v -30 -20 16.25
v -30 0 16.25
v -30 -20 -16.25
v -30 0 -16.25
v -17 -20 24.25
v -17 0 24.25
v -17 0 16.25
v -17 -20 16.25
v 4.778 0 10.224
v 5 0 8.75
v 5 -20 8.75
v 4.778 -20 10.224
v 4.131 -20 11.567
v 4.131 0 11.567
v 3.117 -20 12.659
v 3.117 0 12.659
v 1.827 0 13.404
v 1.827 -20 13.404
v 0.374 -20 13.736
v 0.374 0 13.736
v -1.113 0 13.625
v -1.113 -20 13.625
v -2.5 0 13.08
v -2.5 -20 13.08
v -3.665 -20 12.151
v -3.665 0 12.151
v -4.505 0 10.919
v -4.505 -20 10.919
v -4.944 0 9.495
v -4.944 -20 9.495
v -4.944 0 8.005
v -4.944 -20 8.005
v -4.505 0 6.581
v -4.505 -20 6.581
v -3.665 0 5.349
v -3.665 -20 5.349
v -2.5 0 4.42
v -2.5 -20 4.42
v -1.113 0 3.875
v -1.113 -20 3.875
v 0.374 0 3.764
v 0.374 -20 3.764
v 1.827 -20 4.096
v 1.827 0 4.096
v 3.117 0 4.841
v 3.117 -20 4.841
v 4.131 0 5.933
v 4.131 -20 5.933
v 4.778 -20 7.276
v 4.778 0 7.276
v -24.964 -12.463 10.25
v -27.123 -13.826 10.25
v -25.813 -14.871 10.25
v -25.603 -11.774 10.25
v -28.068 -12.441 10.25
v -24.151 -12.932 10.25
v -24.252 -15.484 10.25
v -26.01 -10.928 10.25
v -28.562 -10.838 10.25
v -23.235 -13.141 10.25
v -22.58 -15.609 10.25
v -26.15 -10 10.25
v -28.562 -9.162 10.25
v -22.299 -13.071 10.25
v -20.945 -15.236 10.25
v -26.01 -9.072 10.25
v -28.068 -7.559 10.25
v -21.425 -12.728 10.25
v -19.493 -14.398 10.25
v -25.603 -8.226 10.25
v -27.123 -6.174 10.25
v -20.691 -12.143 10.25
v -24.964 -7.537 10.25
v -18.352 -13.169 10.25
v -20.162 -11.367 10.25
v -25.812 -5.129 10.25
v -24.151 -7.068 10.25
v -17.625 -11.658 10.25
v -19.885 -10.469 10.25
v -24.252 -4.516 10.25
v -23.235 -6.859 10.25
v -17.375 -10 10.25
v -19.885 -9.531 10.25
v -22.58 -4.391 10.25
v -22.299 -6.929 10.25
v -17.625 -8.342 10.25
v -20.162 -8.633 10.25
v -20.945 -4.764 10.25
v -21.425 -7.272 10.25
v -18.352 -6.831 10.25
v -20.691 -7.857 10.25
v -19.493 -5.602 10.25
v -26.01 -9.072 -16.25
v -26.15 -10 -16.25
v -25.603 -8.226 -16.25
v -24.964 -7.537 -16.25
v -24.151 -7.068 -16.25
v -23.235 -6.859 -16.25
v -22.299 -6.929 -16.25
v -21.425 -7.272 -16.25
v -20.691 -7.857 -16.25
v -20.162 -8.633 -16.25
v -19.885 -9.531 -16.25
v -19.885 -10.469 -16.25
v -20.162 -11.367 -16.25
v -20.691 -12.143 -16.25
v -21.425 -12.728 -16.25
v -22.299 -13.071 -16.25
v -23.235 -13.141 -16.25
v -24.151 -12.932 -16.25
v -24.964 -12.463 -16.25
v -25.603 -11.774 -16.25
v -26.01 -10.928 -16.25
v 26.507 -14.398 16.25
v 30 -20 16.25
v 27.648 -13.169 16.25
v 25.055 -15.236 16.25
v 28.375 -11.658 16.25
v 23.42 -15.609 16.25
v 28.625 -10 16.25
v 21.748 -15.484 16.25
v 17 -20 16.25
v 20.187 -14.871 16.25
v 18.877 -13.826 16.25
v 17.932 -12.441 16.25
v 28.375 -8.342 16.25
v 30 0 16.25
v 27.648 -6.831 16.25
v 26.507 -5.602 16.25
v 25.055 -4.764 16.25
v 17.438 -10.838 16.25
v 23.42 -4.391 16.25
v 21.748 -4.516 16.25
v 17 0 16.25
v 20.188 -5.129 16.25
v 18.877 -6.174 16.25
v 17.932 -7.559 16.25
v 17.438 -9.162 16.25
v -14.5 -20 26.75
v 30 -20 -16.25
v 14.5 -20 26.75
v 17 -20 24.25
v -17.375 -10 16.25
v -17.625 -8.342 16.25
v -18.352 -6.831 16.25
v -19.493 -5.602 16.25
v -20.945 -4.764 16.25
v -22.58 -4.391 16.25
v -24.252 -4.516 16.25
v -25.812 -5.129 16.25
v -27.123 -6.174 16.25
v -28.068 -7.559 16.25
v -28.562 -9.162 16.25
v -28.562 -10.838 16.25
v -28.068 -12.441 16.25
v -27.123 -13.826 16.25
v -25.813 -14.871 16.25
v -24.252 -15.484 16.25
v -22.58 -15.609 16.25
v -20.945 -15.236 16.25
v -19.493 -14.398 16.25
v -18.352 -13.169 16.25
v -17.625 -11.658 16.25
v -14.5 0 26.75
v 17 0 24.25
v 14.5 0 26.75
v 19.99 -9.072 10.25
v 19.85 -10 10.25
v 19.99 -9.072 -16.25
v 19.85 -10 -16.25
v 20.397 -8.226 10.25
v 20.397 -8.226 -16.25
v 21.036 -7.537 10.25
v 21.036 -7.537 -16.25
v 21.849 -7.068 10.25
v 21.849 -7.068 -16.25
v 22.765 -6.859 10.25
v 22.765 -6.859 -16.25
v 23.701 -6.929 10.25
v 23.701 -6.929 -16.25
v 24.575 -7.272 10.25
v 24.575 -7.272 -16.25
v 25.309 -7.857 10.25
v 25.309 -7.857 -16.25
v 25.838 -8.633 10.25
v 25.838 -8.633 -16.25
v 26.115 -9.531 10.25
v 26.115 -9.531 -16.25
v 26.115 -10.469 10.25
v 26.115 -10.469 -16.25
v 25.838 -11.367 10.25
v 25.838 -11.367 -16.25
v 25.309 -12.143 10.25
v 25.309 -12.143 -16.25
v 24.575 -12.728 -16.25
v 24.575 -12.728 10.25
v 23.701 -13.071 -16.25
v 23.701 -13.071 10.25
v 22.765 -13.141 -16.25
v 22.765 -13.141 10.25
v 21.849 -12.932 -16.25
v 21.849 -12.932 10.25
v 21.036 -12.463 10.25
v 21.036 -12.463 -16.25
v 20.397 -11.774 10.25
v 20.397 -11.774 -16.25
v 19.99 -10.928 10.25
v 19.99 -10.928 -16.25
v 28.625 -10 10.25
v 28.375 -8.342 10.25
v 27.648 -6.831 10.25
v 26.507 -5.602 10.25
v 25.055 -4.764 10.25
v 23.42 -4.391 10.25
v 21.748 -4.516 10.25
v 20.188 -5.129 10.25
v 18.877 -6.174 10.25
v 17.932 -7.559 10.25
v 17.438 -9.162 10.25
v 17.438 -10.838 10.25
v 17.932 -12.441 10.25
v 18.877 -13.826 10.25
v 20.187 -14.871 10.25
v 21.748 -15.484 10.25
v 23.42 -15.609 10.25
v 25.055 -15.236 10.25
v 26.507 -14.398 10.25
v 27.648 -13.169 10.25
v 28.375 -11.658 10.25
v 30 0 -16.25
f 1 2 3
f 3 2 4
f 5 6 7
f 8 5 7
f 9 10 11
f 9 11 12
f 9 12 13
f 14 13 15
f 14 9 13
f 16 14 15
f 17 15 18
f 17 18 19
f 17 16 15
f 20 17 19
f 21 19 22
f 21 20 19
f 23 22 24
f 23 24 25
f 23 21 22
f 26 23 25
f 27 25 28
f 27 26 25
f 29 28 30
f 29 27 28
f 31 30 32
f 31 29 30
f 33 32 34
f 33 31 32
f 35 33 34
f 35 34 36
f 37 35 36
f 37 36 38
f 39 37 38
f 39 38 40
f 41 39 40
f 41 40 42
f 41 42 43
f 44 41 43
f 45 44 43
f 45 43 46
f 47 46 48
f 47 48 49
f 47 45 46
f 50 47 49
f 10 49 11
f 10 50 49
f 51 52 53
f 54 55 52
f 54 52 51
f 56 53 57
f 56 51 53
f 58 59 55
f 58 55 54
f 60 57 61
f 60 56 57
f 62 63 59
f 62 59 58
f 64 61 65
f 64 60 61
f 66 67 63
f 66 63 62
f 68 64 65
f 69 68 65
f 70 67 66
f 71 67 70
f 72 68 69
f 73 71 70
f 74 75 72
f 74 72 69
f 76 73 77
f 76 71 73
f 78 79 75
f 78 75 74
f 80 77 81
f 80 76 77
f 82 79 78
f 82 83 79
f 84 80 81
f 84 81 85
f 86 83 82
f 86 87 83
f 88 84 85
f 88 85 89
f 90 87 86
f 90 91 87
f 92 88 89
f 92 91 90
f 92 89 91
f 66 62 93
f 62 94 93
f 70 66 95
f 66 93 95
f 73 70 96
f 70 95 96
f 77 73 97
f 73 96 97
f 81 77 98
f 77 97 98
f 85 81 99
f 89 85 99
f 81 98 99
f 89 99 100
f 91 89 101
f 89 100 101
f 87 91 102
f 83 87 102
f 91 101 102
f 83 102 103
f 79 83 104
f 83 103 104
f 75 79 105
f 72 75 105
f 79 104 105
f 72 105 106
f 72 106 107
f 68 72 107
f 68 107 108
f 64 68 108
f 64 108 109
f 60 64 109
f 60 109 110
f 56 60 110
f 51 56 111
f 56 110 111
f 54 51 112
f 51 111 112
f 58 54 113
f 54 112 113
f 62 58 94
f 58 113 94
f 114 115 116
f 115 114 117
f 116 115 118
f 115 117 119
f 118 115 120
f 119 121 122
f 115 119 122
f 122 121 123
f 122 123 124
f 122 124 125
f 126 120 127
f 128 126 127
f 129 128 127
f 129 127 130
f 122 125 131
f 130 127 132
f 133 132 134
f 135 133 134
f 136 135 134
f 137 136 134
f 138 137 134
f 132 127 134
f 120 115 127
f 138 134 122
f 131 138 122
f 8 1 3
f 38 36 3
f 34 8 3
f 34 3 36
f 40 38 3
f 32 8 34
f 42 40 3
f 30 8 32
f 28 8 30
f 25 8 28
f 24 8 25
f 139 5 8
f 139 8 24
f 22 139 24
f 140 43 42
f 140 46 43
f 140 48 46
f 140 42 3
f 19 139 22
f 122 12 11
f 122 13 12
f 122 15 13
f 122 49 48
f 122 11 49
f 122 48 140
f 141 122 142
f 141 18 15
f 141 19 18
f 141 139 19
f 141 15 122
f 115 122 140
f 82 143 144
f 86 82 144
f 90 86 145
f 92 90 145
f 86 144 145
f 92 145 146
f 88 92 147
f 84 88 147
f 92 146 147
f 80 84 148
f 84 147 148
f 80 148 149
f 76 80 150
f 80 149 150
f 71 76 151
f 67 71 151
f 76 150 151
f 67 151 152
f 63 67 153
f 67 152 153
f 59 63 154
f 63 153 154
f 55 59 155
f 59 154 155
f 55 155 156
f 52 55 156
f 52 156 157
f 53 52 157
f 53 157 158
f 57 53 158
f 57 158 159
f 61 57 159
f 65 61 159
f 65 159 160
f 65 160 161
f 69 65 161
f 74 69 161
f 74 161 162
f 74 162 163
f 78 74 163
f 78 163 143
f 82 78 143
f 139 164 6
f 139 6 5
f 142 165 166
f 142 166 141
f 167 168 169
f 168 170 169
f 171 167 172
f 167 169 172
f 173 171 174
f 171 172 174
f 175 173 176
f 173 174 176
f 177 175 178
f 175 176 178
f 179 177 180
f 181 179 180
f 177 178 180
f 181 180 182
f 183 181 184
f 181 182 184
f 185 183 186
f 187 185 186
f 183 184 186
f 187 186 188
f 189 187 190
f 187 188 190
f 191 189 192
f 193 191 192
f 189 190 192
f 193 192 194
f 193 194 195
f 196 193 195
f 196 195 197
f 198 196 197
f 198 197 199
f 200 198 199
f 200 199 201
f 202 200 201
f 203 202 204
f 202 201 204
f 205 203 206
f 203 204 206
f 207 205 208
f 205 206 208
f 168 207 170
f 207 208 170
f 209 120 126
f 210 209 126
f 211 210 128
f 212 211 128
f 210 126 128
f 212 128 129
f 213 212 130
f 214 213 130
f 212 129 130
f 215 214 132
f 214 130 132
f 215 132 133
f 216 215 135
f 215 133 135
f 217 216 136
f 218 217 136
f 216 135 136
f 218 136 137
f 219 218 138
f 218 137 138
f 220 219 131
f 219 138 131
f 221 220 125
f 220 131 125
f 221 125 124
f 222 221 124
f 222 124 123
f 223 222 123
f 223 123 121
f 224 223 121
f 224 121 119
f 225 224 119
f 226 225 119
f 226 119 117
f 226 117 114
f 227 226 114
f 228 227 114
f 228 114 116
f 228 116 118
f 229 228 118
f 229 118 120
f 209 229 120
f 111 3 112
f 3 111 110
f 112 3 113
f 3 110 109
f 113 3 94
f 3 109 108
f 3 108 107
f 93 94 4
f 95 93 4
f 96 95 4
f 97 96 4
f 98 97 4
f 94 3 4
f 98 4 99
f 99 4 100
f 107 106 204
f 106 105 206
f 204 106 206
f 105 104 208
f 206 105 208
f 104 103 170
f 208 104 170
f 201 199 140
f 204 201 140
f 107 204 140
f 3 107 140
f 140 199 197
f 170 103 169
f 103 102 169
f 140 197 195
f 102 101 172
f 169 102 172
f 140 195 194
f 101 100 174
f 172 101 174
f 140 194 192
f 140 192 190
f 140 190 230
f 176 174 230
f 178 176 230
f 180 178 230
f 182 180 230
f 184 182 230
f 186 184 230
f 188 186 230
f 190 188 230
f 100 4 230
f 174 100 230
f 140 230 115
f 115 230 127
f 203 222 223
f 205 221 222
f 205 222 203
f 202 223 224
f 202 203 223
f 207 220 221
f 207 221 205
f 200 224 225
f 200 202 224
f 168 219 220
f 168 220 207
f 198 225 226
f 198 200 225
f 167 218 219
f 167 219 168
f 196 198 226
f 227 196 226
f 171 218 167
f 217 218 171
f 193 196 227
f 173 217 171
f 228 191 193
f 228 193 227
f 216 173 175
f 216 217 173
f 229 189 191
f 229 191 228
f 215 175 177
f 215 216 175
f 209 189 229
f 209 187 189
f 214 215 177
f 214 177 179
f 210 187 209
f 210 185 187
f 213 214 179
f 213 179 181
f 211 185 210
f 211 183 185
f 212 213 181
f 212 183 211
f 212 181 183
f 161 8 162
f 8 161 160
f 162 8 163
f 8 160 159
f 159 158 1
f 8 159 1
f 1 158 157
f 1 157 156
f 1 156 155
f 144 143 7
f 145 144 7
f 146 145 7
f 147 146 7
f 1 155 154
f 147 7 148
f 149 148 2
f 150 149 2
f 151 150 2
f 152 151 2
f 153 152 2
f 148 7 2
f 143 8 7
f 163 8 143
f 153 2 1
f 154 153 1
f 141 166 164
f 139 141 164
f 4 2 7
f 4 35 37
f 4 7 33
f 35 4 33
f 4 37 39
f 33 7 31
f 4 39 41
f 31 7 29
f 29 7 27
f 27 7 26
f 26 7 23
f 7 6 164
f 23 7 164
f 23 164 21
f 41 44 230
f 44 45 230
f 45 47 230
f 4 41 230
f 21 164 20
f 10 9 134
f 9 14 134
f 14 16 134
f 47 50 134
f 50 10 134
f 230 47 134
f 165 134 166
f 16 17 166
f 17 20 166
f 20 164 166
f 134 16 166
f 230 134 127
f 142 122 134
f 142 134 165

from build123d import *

# Parameters (mm, degrees)
F0_R           = 5
F1_DEPTH       = 20
F3_D           = 6.3
F3_CBORE_D     = 11.25
F3_CBORE_DEPTH = 6
F4_SIZE        = 2.5


with BuildPart() as f1:
    # F0 (on Front) → F1 (new body)
    with BuildSketch(Plane.XZ):
        Polygon((-30, 16.25), (-30, -16.25), (30, -16.25), (30, 16.25), (17, 16.25), (17, 26.75), (-17, 26.75), (-17, 16.25), align=None)
        with Locations((0, 8.75)):
            Circle(F0_R, mode=Mode.SUBTRACT)
    extrude(amount=F1_DEPTH)

    # F3 (through all)
    with Locations(Plane.XY.offset(16.25)):
        with Locations((23, -10), (-23, -10)):
            CounterBoreHole(F3_D / 2, F3_CBORE_D / 2, F3_CBORE_DEPTH)

    # F4
    f4_edges = [f1.edges().sort_by_distance(p)[0] for p in [
        (17, -10, 26.75),
        (-17, -10, 26.75),
    ]]
    chamfer(f4_edges, length=F4_SIZE)


solid = f1.part
